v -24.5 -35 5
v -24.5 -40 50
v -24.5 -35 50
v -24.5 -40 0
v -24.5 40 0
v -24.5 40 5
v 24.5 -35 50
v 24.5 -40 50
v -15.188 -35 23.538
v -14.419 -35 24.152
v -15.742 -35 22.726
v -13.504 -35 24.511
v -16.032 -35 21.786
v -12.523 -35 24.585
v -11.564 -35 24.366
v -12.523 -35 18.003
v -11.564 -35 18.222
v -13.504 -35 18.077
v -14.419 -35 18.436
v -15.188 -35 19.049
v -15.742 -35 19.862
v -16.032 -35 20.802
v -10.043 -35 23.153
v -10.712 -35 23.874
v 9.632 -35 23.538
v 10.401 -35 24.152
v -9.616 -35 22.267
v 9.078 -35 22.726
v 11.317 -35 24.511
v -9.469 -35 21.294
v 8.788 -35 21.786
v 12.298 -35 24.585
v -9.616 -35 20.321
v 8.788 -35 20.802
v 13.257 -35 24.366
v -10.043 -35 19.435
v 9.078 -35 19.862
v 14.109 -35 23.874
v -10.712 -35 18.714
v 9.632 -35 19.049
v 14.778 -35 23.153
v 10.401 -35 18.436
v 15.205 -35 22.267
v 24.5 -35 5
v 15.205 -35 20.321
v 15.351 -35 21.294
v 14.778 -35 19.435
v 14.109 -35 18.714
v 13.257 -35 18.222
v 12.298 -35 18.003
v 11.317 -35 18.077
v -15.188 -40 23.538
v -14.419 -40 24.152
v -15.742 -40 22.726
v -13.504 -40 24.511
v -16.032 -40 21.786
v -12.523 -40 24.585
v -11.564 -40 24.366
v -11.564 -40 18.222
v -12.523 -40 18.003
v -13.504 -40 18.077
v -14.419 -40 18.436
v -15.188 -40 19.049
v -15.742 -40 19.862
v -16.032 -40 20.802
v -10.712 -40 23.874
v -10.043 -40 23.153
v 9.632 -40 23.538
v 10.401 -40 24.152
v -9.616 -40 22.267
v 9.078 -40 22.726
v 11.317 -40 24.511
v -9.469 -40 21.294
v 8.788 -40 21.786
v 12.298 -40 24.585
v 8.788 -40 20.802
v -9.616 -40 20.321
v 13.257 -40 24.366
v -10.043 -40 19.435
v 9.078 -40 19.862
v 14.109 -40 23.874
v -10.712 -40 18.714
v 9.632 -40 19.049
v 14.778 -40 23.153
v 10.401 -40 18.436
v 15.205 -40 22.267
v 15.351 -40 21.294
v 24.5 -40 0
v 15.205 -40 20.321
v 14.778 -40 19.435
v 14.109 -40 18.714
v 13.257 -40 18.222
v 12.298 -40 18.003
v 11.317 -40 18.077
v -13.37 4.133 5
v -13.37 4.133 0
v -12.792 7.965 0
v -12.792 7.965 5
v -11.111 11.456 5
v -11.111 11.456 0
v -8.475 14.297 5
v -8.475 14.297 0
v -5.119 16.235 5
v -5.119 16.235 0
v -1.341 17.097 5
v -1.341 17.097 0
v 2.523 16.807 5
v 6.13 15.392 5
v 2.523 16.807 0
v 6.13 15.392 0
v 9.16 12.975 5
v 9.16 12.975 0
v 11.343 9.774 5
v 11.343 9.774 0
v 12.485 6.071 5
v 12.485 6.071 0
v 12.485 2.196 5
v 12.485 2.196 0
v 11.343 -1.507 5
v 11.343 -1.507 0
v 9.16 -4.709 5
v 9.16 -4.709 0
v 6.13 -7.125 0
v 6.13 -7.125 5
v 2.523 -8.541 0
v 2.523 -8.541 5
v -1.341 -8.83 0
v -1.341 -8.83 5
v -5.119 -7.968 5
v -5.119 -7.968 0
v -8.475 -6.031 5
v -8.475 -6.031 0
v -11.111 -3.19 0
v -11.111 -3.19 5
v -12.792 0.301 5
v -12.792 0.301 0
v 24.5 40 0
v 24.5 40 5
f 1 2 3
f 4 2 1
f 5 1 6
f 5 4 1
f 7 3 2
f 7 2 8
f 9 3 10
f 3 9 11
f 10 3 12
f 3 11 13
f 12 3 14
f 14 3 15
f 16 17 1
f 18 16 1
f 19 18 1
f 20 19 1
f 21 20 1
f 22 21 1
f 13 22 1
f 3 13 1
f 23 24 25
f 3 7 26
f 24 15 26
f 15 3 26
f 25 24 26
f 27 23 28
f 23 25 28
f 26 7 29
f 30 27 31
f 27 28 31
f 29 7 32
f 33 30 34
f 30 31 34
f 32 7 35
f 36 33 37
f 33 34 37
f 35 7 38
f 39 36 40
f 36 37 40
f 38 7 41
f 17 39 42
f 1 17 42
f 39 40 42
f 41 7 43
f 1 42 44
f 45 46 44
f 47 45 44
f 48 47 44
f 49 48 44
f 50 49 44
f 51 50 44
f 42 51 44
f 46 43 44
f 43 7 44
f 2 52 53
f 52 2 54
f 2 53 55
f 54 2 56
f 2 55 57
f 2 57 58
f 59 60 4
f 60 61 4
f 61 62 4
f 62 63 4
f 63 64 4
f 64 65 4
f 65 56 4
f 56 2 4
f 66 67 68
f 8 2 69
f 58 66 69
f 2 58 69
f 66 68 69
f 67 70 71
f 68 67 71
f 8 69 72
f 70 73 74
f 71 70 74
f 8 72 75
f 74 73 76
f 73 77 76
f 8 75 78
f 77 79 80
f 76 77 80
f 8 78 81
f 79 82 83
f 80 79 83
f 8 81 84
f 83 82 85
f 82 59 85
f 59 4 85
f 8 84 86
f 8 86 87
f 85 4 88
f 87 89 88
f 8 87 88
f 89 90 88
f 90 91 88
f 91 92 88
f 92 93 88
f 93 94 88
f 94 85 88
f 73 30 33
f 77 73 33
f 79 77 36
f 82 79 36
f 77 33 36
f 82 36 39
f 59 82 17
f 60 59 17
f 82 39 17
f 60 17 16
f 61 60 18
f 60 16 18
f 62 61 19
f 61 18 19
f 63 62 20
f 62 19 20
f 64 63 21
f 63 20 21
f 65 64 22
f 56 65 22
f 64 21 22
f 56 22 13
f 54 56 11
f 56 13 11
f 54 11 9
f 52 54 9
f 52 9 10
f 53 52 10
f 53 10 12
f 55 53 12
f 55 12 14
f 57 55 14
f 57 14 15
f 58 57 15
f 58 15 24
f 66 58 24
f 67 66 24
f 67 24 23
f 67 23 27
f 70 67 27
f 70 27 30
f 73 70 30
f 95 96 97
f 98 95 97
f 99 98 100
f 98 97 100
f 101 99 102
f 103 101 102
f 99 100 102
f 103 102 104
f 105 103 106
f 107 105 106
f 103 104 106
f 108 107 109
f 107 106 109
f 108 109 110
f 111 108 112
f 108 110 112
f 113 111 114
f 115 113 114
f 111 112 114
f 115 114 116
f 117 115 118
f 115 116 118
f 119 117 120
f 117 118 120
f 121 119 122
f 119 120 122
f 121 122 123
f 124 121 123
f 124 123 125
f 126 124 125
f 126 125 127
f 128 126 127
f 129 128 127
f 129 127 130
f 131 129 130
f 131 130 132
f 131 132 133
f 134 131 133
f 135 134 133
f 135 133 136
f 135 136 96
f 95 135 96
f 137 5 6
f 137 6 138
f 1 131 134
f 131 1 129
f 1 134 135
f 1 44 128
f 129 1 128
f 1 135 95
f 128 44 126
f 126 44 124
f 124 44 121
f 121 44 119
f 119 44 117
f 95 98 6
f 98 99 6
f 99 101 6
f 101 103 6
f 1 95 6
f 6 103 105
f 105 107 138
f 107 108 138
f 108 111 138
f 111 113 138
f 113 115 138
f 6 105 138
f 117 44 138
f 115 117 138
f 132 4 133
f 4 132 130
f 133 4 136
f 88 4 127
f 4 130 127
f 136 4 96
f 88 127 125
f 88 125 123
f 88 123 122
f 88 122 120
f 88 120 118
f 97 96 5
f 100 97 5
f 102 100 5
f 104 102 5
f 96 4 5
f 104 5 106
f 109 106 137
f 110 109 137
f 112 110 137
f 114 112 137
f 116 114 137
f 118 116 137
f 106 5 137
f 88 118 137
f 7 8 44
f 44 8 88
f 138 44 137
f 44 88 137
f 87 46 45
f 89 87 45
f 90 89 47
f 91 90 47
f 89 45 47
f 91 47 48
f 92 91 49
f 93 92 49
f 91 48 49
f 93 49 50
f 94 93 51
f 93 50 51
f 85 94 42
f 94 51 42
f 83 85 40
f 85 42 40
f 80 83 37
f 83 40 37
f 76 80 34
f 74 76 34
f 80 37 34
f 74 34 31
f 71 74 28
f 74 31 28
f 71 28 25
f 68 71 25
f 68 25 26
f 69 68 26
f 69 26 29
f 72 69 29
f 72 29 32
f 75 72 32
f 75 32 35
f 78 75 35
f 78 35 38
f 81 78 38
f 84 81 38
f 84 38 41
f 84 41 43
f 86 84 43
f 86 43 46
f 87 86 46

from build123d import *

# Parameters (mm, degrees)
ESQUISSE1_W             = 49
ESQUISSE1_H             = 80
BOSS_EXTRU_1_DEPTH      = 50
ESQUISSE2_W             = 73.004277741
ESQUISSE2_H             = 90.842499223
ENL_V_MAT_EXTRU_1_DEPTH = 101
D_GAGEMENT_M61_D        = 6.6
D_GAGEMENT_M241_D       = 26


with BuildPart() as part:
    # Esquisse1 → Boss.-Extru.1 (new body)
    with BuildSketch(Plane.XY):
        Rectangle(ESQUISSE1_W, ESQUISSE1_H)
    extrude(amount=BOSS_EXTRU_1_DEPTH)

    # Esquisse2 → Enlèv. mat.-Extru.1 (cut)
    with BuildSketch(Plane(origin=(24.5, 0, 0), x_dir=(0, 0, -1), z_dir=(1, 0, 0))):
        with Locations((-41.502138871, 10.421249612)):
            Rectangle(ESQUISSE2_W, ESQUISSE2_H)
    extrude(amount=-ENL_V_MAT_EXTRU_1_DEPTH, mode=Mode.SUBTRACT)

    # Dégagement M61 (through all)
    with Locations(Plane(origin=(0, -40, 0), x_dir=(-1, 0, 0), z_dir=(0, -1, 0))):
        with Locations((-12.051490403, -21.293816609), (12.769236225, -21.293816609)):
            Hole(D_GAGEMENT_M61_D / 2)

    # Dégagement M241 (through all)
    with Locations(Plane.XY.offset(5)):
        with Locations((-0.37, 4.133244148)):
            Hole(D_GAGEMENT_M241_D / 2)


solid = part.part
